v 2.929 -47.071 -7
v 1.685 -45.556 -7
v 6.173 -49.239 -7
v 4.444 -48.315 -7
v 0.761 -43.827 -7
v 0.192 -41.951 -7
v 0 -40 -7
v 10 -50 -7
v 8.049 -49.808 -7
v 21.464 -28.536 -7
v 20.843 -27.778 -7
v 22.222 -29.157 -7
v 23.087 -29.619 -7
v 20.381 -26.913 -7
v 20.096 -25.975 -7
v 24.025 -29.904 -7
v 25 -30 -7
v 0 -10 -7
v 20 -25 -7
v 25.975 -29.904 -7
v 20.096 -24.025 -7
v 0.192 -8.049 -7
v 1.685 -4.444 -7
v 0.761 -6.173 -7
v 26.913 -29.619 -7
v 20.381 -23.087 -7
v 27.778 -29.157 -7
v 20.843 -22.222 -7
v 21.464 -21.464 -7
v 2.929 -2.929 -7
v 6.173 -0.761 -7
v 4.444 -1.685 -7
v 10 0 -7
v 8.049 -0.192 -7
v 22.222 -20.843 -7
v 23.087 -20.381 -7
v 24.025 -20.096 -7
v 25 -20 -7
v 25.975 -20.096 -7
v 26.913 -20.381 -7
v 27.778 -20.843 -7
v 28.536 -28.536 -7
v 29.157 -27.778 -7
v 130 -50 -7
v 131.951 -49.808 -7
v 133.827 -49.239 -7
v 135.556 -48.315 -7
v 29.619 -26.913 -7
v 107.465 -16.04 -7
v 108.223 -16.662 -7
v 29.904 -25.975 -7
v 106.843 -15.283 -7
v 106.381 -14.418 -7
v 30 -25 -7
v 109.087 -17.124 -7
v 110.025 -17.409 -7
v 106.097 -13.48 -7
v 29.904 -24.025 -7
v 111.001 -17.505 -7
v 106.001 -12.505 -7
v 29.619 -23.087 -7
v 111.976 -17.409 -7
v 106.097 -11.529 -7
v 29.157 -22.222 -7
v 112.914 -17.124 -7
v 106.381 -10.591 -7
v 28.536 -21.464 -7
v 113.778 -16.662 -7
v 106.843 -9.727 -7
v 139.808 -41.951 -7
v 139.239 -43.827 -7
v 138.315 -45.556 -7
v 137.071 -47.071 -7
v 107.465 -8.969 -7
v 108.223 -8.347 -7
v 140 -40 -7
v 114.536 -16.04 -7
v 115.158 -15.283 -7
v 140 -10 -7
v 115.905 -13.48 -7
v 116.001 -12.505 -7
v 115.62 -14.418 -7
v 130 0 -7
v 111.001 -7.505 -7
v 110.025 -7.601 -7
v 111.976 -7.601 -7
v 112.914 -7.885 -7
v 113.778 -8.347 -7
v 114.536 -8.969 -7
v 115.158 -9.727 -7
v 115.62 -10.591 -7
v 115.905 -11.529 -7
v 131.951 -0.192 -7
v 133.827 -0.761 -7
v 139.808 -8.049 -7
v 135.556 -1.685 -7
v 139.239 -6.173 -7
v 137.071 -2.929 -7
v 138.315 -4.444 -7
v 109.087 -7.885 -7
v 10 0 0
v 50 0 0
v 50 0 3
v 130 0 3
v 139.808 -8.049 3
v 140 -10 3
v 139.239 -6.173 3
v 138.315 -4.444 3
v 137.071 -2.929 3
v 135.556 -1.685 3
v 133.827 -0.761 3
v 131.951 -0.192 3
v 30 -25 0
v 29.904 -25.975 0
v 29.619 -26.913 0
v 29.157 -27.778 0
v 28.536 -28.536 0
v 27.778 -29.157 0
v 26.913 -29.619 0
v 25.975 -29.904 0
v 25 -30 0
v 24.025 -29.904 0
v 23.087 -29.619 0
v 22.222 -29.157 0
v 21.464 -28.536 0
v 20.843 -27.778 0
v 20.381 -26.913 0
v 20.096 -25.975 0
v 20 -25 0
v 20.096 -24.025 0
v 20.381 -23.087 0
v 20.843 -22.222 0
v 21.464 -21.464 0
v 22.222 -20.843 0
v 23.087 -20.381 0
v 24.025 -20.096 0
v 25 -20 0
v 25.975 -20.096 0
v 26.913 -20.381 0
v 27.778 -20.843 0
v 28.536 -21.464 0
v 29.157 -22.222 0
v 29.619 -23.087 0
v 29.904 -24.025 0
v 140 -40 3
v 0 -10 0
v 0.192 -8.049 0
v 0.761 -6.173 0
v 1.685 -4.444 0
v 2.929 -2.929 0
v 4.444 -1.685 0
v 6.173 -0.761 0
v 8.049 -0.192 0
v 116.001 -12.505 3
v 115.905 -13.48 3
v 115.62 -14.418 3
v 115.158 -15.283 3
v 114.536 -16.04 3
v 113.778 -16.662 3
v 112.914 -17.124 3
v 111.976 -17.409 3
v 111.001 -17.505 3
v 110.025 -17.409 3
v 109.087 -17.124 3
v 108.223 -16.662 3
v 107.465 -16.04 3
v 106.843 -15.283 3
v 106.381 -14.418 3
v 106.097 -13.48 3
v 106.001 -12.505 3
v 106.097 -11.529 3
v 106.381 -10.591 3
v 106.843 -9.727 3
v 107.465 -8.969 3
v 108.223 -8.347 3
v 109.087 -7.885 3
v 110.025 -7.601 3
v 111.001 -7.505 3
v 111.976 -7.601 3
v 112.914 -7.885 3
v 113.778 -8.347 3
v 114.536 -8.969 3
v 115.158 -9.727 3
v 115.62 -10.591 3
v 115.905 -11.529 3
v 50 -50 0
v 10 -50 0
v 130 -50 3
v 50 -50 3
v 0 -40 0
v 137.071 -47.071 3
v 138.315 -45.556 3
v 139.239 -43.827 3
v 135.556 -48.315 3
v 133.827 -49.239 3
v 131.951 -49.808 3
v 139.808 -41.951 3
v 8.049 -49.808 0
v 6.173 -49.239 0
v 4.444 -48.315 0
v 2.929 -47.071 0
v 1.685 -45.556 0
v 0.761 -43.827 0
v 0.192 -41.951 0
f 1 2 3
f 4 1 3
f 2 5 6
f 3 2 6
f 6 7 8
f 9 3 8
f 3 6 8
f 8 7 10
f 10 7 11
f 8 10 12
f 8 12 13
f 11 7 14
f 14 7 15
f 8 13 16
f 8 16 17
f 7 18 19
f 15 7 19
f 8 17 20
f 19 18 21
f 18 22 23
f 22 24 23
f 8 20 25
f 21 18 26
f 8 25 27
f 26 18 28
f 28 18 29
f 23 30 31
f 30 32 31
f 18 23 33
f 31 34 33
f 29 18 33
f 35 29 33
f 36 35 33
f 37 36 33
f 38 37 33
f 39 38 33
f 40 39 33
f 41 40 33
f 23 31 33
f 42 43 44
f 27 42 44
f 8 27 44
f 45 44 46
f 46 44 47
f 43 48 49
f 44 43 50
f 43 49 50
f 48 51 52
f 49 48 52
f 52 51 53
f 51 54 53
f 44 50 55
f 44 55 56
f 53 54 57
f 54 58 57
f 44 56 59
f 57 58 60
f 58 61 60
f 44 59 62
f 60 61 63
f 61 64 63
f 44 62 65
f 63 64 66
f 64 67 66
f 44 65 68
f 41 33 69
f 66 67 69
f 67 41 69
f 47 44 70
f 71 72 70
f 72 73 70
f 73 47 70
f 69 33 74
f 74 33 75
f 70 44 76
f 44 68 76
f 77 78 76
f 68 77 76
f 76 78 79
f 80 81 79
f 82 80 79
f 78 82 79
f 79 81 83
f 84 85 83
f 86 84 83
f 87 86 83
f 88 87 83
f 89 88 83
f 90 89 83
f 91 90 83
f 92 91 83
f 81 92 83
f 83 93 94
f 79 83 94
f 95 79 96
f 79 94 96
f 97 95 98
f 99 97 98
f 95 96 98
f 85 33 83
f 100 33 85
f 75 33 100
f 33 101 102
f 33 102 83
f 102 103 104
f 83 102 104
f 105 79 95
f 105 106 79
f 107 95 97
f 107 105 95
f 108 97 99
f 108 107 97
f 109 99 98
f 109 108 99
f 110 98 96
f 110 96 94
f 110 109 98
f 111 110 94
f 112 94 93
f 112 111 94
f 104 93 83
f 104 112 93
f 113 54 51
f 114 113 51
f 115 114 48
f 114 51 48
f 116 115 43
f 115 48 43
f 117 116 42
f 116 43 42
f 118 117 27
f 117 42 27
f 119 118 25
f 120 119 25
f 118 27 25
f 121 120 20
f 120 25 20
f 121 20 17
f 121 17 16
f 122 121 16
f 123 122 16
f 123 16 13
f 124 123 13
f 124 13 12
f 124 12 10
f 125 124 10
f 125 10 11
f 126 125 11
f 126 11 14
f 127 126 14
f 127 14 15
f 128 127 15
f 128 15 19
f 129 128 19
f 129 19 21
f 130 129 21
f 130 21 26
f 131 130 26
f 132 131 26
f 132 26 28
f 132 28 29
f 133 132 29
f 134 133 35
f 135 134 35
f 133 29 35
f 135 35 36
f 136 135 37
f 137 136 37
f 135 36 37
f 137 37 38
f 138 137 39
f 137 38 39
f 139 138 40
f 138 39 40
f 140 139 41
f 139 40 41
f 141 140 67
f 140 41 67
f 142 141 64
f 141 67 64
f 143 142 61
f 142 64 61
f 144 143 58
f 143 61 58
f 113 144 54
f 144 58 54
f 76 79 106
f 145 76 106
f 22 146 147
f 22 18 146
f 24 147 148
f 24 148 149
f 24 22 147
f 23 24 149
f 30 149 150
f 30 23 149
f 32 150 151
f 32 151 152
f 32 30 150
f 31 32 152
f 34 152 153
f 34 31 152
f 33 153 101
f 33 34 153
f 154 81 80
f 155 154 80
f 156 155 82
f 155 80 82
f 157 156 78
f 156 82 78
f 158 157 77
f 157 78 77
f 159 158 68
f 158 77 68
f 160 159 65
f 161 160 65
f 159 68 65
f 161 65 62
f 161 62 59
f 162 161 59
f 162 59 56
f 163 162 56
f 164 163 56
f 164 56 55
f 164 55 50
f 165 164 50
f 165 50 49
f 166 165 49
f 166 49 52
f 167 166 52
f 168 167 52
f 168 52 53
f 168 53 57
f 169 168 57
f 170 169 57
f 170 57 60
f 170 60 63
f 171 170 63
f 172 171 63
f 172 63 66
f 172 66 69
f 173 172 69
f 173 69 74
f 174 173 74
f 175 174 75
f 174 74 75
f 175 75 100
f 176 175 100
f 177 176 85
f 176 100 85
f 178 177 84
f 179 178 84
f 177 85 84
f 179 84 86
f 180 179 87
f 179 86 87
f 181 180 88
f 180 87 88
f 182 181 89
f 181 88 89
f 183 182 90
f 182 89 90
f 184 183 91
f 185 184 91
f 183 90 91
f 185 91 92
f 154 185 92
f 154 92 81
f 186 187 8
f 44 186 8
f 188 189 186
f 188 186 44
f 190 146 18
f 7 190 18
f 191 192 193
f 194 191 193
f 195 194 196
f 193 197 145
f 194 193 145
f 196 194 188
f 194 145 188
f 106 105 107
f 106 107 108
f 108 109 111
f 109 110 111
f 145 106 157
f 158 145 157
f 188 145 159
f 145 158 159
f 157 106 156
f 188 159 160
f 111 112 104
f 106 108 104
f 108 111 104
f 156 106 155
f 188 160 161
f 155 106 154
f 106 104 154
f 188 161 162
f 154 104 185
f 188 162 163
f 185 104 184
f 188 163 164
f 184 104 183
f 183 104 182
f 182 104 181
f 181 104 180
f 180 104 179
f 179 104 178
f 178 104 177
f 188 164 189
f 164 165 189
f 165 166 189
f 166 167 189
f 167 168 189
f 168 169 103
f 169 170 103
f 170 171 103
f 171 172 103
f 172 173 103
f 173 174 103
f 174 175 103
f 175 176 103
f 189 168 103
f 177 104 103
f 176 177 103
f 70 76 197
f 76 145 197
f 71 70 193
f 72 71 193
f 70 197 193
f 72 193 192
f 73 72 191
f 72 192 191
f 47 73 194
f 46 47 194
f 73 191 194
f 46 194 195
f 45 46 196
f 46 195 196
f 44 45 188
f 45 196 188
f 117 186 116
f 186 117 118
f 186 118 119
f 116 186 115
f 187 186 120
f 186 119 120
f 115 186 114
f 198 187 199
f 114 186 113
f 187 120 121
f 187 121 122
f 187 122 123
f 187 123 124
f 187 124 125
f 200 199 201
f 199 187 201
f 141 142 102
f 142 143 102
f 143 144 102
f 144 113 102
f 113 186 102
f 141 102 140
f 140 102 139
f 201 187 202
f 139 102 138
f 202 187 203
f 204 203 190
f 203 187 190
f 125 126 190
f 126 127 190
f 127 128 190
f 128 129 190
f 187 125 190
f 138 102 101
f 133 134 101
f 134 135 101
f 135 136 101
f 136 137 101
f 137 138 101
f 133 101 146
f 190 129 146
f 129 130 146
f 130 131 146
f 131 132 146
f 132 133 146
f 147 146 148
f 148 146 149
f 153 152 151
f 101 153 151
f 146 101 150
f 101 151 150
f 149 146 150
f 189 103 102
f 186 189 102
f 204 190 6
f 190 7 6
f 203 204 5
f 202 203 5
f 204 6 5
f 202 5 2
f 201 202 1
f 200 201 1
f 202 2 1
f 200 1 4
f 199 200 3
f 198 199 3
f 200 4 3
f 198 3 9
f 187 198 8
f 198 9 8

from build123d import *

# Parameters (mm, degrees)
F1_DEPTH = 50
F2_R     = 10
F3_R     = 5
F4_DEPTH = 25


# Not quite as in the source:
# - a feature of the source that left no trace in its solid (it failed there, or was rolled back) is left out


with BuildPart() as f1:
    # F0 (on Front) → F1 (new body)
    with BuildSketch(Plane.XZ):
        Polygon((50, 0), (0, 0), (0, -7), (140, -7), (140, 3), (50, 3), align=None)
    extrude(amount=F1_DEPTH)

    # F2
    f2_edges = [f1.edges().sort_by_distance(p)[0] for p in [
        (0, -50, -3.5),
        (0, 0, -3.5),
        (140, 0, -2),
        (140, -50, -2),
    ]]
    fillet(f2_edges, radius=F2_R)

    # F3 (on face) → F4 (cut)
    with BuildSketch(Plane(origin=(0, 0, -7), x_dir=(1, 0, 0), z_dir=(0, 0, -1))):
        with Locations((25, 25)):
            Circle(F3_R)
        with Locations((111.0006011832, 12.5048019411)):
            Circle(F3_R)
    extrude(amount=-F4_DEPTH, mode=Mode.SUBTRACT)


solid = f1.part
